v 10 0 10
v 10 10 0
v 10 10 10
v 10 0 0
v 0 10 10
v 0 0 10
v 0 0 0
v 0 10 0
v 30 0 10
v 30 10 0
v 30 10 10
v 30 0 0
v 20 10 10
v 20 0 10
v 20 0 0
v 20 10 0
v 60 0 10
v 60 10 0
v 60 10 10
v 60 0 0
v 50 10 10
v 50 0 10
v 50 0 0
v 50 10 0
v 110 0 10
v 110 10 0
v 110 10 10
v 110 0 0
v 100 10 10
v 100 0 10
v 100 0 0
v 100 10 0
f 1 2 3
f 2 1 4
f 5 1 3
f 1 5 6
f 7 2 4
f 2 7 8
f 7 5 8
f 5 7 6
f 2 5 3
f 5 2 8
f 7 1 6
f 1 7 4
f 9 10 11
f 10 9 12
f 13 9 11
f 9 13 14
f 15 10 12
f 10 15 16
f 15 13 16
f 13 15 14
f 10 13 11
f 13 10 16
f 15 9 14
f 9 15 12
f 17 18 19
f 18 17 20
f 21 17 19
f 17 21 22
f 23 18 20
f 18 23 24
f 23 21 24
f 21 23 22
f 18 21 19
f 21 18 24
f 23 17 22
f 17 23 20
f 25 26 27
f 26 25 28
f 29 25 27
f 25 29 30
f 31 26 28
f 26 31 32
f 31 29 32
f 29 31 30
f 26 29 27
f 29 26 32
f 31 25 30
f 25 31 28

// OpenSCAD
cube_size=10;

for (a =[0,10+cube_size,30+cube_size*2,70+cube_size*3]){
translate ([a,0,0])
cube(cube_size);
}
